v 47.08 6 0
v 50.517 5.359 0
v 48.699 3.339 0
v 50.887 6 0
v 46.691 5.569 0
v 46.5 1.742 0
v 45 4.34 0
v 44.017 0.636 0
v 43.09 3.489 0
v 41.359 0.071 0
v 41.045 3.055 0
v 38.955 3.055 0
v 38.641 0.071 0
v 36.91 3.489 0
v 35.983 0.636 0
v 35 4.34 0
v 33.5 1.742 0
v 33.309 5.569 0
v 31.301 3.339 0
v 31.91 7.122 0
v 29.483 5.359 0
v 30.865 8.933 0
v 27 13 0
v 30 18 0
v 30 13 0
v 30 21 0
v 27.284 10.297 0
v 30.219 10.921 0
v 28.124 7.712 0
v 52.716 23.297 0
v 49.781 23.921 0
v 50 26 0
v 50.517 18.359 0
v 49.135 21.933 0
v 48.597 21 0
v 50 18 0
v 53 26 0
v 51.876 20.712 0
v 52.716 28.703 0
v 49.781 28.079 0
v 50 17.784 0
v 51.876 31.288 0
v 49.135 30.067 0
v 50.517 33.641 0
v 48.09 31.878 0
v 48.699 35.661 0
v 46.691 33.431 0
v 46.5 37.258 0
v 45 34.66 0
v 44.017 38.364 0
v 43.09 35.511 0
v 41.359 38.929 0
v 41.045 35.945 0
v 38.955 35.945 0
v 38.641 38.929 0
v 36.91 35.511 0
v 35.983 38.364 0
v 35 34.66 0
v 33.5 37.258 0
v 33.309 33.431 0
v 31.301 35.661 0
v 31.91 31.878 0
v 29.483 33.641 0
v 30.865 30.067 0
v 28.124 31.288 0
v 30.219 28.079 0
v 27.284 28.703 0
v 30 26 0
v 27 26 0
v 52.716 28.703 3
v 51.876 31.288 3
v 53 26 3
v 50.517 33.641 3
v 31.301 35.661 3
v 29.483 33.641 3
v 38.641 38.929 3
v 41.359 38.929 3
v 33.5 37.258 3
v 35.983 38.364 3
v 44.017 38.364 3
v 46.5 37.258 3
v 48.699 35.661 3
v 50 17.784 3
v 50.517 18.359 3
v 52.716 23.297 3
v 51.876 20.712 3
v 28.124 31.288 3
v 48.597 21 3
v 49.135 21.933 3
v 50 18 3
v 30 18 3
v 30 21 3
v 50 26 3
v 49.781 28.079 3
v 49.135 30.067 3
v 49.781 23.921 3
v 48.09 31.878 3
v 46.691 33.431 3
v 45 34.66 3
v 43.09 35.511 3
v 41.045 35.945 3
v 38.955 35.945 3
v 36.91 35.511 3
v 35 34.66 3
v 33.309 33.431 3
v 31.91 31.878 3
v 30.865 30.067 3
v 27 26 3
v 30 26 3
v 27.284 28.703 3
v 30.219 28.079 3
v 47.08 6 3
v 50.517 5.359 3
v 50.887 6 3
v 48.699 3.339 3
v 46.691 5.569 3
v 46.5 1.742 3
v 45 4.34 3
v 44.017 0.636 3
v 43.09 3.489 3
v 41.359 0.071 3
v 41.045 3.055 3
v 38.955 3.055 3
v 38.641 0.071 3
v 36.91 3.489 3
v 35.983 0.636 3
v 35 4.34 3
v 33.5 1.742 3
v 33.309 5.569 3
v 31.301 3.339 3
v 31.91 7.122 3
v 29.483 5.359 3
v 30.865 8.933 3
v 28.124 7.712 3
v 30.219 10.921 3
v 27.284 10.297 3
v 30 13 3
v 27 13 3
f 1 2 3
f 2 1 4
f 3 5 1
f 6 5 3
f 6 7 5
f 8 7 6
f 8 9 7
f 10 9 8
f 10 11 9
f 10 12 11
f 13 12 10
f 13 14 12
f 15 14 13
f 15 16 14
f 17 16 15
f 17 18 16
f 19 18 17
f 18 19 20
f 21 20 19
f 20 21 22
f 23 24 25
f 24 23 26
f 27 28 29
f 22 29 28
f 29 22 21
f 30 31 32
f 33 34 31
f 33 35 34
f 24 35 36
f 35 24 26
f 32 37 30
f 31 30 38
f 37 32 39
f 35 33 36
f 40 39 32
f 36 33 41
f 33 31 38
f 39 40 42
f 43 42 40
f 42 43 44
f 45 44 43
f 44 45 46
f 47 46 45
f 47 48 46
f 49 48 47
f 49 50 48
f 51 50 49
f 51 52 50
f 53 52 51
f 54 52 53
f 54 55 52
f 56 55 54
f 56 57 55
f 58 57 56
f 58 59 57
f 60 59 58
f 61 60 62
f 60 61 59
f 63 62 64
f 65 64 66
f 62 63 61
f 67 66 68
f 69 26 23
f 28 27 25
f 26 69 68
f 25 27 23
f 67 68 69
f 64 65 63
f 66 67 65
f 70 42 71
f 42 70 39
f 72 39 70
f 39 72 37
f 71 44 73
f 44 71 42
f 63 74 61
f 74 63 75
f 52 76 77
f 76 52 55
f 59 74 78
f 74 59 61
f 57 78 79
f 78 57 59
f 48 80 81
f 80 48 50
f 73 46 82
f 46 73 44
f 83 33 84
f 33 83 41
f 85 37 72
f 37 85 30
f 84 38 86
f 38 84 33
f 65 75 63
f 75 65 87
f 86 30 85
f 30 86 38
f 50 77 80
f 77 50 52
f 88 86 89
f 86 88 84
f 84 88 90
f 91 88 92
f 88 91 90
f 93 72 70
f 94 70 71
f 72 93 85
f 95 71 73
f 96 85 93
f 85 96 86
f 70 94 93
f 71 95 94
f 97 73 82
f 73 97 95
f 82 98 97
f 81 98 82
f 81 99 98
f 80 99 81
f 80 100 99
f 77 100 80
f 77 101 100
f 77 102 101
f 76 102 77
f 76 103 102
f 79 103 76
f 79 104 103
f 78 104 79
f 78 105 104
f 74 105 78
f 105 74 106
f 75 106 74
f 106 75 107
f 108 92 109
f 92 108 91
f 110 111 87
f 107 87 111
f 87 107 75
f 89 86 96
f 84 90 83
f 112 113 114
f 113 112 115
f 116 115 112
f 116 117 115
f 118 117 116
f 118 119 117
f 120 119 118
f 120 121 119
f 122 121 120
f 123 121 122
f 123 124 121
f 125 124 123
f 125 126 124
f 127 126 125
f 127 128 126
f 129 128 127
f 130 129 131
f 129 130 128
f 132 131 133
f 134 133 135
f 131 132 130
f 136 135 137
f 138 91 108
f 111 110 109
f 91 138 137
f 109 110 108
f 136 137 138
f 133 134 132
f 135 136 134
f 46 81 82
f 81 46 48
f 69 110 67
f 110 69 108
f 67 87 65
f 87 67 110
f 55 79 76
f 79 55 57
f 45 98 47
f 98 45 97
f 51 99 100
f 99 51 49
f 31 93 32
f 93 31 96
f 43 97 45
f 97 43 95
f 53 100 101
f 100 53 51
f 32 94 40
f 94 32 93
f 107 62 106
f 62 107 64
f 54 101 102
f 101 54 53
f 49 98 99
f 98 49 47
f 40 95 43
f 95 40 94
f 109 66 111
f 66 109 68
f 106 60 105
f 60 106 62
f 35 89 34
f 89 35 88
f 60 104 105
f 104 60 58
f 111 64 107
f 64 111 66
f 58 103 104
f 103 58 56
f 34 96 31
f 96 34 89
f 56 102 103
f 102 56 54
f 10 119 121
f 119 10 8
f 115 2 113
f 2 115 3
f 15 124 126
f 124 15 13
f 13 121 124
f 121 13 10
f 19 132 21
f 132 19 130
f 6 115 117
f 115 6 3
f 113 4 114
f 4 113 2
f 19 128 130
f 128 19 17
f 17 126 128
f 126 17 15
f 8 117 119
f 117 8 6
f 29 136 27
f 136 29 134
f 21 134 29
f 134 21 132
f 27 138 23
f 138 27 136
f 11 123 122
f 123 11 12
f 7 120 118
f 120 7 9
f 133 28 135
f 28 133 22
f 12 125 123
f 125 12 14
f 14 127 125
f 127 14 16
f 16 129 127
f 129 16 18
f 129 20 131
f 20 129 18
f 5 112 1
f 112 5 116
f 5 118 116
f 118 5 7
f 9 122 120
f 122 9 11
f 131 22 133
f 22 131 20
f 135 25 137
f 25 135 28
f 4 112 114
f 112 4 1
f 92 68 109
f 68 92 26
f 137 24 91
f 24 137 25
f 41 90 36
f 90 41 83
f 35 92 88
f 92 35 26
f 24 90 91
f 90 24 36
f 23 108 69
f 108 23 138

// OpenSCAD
//буква e

union(){
translate([28,18,0]) cube([22,3,3]);
translate([27,13,0]) cube([3,13,3]);
difference(){
union(){
	
  difference(){
  translate([40,26,0]) cylinder(3,13,13);
  translate([40,26,-1]) cylinder(5,10,10);
  translate([32,12,-1]) cube([16,10,5]);

}

difference(){
  translate([40,13,0]) cylinder(3,13,13);
  translate([40,13,-1]) cylinder(5,10,10);
  translate([32,15,-1]) cube([19,13,5]);
  translate([40,6,-1]) cube(20);
}
}
translate([30,13,-1]) cube([3,13,5]);
translate([40,10,-1]) cube(10);
}
}
